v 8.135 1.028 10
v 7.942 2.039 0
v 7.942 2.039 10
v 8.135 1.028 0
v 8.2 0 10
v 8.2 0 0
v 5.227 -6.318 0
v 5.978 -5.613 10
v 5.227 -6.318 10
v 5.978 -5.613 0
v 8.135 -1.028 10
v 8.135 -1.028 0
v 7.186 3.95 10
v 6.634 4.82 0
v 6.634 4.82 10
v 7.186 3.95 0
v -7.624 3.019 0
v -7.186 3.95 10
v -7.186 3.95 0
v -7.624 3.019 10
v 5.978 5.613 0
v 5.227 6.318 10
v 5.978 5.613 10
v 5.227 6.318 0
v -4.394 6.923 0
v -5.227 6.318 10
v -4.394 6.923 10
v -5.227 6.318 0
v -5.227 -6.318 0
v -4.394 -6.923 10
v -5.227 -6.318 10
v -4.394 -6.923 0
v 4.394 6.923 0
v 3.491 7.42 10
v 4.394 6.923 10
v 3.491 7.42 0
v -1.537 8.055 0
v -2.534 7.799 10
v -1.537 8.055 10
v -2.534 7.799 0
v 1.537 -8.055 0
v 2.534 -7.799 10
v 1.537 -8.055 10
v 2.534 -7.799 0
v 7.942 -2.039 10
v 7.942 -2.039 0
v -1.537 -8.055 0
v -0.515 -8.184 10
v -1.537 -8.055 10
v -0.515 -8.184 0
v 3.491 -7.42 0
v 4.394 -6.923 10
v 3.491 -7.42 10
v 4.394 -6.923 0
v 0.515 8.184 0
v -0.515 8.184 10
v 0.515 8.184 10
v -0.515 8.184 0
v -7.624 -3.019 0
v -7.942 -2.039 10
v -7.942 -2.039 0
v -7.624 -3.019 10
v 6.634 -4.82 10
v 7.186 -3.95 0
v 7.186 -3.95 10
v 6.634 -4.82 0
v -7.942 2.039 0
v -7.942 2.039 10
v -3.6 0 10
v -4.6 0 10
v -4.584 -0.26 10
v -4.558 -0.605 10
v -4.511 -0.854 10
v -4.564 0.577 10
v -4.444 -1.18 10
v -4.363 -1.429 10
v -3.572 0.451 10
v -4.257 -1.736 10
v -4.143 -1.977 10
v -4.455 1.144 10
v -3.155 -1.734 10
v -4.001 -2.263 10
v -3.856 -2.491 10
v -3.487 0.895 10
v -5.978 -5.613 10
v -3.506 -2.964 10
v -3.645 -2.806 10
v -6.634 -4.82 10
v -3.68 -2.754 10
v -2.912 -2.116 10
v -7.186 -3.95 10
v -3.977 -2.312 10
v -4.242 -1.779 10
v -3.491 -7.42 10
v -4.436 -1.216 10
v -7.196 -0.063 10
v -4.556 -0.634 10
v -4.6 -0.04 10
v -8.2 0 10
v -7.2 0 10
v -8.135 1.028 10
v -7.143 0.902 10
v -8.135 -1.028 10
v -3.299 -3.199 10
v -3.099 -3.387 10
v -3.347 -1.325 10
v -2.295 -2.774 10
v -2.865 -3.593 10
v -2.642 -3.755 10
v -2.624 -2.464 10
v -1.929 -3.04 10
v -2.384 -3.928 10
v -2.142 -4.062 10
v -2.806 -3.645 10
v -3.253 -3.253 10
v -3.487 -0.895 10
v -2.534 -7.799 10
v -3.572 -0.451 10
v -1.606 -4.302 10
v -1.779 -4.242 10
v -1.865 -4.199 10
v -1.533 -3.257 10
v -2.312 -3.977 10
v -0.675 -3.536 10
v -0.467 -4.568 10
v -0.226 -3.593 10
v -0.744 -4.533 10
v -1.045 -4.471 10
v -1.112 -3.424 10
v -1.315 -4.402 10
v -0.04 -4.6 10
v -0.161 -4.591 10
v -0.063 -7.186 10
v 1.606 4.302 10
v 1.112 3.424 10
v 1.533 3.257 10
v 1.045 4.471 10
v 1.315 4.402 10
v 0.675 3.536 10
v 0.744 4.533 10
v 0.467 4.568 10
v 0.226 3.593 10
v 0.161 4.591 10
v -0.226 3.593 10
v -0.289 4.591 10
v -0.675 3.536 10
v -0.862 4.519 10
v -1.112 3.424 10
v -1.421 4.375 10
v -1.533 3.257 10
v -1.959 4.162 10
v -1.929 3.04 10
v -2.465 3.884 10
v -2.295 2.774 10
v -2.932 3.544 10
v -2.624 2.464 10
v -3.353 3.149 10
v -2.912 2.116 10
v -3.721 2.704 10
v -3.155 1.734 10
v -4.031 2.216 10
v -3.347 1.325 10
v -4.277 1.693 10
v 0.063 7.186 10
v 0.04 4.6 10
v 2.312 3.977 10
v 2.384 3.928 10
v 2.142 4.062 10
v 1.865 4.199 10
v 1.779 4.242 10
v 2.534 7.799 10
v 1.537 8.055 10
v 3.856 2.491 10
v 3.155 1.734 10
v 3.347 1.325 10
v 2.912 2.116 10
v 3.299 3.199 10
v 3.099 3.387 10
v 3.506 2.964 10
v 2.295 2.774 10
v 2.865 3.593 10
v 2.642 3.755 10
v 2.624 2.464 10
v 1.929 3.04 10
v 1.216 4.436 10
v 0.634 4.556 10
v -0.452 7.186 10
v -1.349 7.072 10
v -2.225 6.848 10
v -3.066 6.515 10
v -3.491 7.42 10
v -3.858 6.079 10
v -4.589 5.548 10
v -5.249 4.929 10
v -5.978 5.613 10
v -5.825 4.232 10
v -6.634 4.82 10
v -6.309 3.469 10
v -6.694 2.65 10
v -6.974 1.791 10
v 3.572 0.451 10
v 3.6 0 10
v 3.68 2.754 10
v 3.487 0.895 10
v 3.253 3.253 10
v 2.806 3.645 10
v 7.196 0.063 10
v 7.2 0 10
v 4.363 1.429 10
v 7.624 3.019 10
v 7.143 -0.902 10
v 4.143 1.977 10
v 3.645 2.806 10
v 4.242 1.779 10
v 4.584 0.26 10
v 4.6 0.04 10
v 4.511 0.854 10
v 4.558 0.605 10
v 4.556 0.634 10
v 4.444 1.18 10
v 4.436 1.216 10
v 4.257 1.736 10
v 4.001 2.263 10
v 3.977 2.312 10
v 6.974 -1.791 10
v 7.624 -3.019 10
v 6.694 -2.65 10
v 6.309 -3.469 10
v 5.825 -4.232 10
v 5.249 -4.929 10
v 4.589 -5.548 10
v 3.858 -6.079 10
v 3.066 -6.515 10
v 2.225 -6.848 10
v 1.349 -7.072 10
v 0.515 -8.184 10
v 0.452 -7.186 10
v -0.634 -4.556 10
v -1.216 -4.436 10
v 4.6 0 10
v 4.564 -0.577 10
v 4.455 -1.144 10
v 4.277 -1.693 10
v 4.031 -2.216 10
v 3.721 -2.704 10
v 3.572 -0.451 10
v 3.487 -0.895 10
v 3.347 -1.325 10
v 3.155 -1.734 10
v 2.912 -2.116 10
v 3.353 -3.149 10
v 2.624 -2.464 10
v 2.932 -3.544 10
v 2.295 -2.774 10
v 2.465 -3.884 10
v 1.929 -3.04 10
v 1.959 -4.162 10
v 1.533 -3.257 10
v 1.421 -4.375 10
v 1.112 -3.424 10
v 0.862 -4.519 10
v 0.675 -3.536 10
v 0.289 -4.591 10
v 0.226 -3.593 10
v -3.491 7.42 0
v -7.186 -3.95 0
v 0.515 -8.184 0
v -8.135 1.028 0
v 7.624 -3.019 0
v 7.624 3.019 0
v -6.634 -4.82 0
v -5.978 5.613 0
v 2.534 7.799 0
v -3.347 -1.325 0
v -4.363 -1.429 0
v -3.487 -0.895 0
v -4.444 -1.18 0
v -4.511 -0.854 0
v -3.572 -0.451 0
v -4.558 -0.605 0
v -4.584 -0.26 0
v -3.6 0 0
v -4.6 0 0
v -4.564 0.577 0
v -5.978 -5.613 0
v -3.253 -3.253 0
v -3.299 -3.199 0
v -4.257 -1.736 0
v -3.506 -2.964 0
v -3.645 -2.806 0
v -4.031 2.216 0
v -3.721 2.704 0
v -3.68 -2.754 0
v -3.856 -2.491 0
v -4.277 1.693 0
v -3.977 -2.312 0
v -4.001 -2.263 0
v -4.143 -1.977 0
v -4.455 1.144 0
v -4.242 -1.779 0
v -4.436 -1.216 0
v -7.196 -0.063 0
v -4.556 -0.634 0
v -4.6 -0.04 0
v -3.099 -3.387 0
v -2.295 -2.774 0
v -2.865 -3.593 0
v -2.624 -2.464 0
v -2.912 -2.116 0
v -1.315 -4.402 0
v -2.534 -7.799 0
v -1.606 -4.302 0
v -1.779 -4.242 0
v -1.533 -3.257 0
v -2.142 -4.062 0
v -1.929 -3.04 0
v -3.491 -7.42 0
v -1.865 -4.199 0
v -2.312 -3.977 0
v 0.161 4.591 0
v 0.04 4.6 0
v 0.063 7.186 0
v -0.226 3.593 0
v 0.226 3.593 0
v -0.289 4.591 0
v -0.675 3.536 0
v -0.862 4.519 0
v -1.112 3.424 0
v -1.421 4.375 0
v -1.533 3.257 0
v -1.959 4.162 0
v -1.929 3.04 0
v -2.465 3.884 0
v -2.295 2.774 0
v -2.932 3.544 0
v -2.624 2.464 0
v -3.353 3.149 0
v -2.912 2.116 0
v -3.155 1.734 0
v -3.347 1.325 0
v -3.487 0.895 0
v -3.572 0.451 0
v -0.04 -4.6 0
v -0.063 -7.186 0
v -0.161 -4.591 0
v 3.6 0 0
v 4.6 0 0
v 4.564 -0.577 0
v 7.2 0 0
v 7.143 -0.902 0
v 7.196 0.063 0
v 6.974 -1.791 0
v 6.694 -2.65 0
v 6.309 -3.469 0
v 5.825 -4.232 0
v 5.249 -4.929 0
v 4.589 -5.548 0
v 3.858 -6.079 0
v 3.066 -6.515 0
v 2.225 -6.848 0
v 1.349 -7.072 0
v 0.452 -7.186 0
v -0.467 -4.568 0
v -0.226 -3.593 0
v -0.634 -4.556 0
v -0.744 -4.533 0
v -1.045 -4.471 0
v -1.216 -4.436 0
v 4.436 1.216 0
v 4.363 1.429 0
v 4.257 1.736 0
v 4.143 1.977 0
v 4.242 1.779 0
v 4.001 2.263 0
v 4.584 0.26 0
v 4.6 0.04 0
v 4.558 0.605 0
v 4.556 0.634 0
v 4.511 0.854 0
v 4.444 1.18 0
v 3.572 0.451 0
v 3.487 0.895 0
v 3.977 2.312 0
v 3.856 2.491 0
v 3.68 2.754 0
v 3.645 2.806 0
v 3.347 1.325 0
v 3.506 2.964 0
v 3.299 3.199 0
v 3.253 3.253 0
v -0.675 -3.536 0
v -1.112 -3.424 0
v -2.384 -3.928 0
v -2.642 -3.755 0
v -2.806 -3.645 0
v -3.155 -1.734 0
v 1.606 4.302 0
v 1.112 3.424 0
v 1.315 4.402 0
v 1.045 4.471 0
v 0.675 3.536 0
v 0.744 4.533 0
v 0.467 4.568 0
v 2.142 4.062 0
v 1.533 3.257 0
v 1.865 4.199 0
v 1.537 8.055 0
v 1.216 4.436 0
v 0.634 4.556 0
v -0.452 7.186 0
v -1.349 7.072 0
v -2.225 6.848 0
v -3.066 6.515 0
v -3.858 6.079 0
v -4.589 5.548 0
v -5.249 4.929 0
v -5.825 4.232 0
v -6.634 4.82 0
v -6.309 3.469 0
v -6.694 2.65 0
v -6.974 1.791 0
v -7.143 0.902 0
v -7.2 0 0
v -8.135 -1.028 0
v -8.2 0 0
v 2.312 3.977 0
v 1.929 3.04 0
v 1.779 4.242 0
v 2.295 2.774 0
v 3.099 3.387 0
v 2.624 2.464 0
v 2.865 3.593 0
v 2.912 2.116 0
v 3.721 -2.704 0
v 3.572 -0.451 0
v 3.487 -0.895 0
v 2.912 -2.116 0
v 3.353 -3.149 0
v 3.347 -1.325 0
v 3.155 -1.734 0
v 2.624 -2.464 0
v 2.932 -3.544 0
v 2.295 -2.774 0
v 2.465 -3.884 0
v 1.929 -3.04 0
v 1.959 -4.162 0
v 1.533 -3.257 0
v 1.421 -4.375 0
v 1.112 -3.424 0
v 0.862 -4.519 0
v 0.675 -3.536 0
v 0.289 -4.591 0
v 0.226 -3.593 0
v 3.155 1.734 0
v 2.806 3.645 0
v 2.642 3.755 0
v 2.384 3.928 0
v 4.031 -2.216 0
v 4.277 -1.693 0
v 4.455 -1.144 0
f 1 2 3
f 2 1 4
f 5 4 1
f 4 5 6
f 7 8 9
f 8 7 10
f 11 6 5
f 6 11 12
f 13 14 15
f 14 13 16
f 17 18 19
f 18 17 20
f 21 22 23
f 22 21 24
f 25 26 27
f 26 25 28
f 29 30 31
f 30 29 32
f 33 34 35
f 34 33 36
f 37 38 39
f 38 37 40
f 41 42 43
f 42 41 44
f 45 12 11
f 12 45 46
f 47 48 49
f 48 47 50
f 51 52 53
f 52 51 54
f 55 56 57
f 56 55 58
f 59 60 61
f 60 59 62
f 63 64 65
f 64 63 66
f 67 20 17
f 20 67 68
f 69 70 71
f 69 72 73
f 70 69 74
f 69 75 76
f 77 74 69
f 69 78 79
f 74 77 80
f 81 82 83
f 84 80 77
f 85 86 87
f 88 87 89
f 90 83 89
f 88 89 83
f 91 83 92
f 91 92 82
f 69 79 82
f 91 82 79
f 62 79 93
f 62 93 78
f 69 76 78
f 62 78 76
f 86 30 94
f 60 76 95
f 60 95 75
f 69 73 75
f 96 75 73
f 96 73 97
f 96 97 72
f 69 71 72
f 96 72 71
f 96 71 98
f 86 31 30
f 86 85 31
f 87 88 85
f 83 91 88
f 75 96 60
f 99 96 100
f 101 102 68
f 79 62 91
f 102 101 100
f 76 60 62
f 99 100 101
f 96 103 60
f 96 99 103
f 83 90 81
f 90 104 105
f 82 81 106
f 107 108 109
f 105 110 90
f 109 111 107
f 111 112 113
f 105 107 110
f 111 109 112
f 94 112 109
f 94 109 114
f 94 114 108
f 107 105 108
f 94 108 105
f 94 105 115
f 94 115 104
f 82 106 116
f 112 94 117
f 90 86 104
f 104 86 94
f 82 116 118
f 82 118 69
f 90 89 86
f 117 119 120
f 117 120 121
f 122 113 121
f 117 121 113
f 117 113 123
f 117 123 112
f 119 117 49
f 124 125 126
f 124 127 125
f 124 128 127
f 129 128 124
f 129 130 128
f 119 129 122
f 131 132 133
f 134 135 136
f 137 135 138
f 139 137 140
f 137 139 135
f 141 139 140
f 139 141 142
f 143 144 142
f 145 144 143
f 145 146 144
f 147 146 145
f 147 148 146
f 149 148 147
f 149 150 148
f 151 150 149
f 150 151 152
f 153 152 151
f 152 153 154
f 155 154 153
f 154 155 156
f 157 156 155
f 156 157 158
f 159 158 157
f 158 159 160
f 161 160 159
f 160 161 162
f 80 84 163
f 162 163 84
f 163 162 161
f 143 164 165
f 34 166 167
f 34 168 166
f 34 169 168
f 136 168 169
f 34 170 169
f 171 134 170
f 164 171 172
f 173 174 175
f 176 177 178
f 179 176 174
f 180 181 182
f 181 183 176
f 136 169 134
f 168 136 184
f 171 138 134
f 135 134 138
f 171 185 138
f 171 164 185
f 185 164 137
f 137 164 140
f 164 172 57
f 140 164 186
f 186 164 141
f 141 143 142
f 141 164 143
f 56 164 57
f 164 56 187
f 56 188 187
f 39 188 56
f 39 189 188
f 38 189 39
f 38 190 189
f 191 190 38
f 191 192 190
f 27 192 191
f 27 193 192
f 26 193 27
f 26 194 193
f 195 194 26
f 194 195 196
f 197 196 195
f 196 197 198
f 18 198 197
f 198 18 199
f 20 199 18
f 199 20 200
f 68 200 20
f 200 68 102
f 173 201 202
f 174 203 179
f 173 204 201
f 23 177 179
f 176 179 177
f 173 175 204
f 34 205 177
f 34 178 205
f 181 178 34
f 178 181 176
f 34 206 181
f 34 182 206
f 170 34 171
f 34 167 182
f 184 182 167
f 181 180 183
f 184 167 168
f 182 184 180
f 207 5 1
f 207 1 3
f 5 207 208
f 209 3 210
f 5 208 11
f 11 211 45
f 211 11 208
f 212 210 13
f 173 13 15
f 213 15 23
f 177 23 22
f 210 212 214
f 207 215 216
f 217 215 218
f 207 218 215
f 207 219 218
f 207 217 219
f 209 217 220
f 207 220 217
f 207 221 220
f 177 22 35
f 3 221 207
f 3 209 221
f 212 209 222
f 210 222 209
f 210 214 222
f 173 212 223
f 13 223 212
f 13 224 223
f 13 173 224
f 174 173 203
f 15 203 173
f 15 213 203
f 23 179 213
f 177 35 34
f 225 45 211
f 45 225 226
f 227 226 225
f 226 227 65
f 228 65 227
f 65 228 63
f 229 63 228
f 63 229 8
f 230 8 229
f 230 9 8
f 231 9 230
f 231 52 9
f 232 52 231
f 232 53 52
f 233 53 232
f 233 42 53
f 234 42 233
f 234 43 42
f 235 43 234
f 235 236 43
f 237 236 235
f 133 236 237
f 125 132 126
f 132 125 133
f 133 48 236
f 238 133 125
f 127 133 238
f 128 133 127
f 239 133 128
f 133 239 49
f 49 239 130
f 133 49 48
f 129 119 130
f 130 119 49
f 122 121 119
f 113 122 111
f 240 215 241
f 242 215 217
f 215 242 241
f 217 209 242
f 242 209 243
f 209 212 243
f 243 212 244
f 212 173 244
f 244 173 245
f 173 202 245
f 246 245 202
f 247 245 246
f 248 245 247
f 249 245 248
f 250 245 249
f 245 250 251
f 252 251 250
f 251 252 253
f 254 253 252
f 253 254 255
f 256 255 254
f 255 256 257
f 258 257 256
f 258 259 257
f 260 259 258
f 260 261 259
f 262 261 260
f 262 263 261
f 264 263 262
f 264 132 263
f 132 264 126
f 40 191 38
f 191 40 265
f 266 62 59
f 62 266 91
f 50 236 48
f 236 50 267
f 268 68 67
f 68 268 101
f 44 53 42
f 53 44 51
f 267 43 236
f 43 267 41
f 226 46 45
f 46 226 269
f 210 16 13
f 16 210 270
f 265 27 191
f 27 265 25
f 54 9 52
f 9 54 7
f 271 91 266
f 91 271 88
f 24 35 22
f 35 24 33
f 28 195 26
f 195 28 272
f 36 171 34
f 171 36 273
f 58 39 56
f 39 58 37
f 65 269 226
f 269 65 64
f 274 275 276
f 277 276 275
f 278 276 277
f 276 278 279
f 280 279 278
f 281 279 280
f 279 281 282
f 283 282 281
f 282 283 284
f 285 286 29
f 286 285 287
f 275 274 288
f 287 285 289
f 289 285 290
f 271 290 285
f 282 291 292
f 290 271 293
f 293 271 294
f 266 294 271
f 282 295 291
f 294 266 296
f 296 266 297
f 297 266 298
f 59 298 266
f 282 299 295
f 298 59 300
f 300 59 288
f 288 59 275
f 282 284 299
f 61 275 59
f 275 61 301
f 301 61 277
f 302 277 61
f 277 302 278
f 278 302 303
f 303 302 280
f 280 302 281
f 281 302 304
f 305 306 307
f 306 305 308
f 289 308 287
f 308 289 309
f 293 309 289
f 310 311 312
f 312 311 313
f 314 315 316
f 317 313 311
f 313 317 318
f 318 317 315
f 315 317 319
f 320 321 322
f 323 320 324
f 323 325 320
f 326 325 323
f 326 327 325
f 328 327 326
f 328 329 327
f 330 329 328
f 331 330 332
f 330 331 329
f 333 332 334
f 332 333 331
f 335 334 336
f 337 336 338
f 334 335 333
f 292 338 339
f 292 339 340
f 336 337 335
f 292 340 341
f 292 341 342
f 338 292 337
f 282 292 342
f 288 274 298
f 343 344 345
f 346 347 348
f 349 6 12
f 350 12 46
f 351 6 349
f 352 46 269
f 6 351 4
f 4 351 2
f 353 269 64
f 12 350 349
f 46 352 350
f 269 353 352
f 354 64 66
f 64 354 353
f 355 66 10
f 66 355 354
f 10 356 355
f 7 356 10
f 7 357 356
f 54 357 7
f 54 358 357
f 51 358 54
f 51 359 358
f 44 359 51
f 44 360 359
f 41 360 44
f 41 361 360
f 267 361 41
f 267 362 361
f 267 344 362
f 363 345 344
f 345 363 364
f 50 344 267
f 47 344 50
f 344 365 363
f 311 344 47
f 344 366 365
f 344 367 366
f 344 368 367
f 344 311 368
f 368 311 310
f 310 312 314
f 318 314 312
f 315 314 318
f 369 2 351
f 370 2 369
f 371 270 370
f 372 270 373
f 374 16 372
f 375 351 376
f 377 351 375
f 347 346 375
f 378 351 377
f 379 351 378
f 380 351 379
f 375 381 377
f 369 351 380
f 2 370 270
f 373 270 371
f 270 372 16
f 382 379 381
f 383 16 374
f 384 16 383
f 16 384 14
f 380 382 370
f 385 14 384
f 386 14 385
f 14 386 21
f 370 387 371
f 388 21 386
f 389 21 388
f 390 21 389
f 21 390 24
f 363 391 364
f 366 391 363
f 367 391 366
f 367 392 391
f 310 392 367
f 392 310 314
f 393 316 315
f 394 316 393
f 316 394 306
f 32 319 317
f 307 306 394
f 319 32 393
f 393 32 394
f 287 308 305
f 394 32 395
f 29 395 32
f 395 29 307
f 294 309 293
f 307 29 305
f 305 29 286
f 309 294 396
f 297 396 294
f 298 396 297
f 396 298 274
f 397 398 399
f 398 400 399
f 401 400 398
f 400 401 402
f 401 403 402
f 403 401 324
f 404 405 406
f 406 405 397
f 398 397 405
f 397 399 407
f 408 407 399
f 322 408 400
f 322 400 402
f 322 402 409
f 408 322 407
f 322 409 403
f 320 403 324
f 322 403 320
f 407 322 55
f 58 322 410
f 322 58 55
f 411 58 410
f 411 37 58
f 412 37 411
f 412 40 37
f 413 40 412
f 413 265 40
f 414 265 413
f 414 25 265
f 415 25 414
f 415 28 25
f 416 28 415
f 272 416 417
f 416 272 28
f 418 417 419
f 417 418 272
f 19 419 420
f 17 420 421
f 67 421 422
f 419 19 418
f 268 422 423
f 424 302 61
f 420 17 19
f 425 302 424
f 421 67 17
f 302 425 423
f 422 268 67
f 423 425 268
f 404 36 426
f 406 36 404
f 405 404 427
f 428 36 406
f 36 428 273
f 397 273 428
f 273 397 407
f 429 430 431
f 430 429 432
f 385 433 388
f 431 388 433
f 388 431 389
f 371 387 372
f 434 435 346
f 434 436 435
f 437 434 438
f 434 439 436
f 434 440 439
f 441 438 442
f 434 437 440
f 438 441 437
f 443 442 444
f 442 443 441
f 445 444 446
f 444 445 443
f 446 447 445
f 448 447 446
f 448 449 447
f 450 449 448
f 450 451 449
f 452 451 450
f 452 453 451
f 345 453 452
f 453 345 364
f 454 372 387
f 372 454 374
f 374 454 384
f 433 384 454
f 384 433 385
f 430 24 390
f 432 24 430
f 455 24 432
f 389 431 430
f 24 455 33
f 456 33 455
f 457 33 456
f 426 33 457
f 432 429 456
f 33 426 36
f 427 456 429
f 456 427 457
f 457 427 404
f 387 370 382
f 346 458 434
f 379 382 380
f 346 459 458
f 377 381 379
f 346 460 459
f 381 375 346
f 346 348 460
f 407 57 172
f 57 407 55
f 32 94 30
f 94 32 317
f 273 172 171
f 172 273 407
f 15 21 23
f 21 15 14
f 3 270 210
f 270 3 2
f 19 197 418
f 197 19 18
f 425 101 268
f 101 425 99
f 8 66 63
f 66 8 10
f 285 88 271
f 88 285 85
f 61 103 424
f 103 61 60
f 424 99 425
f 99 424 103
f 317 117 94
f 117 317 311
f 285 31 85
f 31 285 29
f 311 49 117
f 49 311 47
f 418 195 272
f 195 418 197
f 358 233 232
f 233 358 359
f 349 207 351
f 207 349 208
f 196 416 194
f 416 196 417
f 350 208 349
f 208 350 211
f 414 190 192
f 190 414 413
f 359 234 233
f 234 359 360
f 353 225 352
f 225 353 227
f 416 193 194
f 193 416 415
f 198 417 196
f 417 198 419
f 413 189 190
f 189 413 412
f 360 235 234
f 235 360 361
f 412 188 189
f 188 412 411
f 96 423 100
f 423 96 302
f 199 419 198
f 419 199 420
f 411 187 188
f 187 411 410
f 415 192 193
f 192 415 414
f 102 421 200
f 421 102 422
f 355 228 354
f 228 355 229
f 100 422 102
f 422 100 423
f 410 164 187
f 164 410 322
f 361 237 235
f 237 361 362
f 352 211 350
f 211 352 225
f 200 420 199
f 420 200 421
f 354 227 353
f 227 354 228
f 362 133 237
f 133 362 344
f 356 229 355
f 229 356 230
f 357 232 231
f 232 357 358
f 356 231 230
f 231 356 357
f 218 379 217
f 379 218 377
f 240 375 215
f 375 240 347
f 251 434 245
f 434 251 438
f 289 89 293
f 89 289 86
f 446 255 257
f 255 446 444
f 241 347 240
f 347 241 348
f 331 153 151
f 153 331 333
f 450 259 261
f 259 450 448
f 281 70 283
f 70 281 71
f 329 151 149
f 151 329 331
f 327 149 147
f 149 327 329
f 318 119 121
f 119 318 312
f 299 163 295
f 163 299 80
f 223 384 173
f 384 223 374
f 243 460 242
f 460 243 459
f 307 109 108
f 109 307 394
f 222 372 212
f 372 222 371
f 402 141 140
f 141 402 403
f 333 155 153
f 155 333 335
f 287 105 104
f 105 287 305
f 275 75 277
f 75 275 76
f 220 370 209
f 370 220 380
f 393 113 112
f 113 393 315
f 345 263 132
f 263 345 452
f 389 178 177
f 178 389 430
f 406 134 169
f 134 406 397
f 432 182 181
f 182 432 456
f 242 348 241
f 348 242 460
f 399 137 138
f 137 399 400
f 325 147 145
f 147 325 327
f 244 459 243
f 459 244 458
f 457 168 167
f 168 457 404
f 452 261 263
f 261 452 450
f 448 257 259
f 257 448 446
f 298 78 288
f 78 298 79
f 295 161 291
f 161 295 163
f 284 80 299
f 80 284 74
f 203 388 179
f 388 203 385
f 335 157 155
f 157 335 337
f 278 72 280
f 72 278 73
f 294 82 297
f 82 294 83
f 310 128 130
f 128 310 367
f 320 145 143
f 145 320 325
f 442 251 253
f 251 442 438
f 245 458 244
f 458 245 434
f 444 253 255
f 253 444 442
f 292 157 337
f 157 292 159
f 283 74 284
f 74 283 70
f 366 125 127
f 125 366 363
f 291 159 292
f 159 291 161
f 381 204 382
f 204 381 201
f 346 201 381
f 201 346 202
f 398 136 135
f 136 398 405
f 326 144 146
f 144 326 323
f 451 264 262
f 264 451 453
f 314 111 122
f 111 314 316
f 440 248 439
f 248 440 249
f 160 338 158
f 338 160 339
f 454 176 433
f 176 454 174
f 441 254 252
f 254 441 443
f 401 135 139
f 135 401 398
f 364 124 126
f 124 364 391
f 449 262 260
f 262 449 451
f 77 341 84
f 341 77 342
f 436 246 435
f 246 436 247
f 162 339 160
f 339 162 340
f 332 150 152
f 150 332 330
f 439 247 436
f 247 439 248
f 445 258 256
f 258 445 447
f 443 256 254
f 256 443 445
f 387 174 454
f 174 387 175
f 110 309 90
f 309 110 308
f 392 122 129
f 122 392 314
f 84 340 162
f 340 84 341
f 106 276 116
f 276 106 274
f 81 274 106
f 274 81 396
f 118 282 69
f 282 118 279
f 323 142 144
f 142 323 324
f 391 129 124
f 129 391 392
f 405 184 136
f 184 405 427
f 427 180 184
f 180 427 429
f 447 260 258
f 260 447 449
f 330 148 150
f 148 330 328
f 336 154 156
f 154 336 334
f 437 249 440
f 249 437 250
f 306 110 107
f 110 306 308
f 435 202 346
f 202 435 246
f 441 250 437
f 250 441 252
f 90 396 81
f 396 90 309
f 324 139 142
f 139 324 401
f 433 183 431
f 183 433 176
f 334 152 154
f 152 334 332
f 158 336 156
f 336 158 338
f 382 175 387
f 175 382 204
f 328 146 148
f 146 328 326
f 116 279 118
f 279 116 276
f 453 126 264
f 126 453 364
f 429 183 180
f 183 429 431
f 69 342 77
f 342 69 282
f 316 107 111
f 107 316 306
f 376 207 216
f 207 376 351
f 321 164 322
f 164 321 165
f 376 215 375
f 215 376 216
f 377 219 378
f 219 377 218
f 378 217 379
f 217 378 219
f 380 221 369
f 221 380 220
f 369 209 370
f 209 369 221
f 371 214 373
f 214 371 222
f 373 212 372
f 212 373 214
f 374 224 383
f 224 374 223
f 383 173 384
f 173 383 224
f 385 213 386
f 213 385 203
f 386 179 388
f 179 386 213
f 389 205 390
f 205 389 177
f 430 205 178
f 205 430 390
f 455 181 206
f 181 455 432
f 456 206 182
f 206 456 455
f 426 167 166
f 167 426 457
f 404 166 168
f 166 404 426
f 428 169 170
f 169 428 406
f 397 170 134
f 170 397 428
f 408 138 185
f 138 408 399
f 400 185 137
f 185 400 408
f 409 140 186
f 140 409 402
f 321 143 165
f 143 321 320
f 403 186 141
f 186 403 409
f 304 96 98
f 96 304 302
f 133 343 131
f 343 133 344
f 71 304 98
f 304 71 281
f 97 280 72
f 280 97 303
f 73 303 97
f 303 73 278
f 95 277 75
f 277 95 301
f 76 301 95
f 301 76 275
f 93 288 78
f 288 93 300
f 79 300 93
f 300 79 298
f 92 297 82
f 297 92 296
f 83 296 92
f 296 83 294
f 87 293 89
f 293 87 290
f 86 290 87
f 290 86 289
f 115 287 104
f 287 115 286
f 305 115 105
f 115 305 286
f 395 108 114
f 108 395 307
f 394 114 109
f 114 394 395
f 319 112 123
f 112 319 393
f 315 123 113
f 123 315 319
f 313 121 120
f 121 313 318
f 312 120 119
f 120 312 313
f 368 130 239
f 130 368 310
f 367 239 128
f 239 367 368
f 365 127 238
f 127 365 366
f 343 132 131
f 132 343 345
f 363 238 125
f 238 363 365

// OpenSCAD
renderSpacer(holeRadius=3.6, height=10, withPeg=false, $fn=50);

module renderSpacer(holeRadius, height, withPeg = false) {
  pegHeight = 5;

  difference() {
    cylinder(r=holeRadius * 2 + 1, h=height);
    translate([0, 0, -.5]) cylinder(r=holeRadius * 2, h=height + 1);
  }

  difference() {
    cylinder(r=holeRadius + 1, h=height);
    translate([0, 0, -.5]) cylinder(r=holeRadius, h=height + 1);
  }

  for (a = [0:1]) {
    rotate([0, 0, a * 180 + .5]) {
      rotate_extrude(angle=89) {
        polygon(
          [
            [holeRadius + 1, 0],
            [holeRadius * 2 + .2, 0],
            [holeRadius * 2 + .2, height],
            [holeRadius + 1, height],
          ]
        );

        if (withPeg) {
          polygon(
            [
              [holeRadius + 1 + .2, 0],
              [holeRadius * 2 - .2, 0],
              [holeRadius * 2 - .2, height + pegHeight],
              [holeRadius + 1 + .2, height + pegHeight],
            ]
          );
        }
      }
    }
  }
}
